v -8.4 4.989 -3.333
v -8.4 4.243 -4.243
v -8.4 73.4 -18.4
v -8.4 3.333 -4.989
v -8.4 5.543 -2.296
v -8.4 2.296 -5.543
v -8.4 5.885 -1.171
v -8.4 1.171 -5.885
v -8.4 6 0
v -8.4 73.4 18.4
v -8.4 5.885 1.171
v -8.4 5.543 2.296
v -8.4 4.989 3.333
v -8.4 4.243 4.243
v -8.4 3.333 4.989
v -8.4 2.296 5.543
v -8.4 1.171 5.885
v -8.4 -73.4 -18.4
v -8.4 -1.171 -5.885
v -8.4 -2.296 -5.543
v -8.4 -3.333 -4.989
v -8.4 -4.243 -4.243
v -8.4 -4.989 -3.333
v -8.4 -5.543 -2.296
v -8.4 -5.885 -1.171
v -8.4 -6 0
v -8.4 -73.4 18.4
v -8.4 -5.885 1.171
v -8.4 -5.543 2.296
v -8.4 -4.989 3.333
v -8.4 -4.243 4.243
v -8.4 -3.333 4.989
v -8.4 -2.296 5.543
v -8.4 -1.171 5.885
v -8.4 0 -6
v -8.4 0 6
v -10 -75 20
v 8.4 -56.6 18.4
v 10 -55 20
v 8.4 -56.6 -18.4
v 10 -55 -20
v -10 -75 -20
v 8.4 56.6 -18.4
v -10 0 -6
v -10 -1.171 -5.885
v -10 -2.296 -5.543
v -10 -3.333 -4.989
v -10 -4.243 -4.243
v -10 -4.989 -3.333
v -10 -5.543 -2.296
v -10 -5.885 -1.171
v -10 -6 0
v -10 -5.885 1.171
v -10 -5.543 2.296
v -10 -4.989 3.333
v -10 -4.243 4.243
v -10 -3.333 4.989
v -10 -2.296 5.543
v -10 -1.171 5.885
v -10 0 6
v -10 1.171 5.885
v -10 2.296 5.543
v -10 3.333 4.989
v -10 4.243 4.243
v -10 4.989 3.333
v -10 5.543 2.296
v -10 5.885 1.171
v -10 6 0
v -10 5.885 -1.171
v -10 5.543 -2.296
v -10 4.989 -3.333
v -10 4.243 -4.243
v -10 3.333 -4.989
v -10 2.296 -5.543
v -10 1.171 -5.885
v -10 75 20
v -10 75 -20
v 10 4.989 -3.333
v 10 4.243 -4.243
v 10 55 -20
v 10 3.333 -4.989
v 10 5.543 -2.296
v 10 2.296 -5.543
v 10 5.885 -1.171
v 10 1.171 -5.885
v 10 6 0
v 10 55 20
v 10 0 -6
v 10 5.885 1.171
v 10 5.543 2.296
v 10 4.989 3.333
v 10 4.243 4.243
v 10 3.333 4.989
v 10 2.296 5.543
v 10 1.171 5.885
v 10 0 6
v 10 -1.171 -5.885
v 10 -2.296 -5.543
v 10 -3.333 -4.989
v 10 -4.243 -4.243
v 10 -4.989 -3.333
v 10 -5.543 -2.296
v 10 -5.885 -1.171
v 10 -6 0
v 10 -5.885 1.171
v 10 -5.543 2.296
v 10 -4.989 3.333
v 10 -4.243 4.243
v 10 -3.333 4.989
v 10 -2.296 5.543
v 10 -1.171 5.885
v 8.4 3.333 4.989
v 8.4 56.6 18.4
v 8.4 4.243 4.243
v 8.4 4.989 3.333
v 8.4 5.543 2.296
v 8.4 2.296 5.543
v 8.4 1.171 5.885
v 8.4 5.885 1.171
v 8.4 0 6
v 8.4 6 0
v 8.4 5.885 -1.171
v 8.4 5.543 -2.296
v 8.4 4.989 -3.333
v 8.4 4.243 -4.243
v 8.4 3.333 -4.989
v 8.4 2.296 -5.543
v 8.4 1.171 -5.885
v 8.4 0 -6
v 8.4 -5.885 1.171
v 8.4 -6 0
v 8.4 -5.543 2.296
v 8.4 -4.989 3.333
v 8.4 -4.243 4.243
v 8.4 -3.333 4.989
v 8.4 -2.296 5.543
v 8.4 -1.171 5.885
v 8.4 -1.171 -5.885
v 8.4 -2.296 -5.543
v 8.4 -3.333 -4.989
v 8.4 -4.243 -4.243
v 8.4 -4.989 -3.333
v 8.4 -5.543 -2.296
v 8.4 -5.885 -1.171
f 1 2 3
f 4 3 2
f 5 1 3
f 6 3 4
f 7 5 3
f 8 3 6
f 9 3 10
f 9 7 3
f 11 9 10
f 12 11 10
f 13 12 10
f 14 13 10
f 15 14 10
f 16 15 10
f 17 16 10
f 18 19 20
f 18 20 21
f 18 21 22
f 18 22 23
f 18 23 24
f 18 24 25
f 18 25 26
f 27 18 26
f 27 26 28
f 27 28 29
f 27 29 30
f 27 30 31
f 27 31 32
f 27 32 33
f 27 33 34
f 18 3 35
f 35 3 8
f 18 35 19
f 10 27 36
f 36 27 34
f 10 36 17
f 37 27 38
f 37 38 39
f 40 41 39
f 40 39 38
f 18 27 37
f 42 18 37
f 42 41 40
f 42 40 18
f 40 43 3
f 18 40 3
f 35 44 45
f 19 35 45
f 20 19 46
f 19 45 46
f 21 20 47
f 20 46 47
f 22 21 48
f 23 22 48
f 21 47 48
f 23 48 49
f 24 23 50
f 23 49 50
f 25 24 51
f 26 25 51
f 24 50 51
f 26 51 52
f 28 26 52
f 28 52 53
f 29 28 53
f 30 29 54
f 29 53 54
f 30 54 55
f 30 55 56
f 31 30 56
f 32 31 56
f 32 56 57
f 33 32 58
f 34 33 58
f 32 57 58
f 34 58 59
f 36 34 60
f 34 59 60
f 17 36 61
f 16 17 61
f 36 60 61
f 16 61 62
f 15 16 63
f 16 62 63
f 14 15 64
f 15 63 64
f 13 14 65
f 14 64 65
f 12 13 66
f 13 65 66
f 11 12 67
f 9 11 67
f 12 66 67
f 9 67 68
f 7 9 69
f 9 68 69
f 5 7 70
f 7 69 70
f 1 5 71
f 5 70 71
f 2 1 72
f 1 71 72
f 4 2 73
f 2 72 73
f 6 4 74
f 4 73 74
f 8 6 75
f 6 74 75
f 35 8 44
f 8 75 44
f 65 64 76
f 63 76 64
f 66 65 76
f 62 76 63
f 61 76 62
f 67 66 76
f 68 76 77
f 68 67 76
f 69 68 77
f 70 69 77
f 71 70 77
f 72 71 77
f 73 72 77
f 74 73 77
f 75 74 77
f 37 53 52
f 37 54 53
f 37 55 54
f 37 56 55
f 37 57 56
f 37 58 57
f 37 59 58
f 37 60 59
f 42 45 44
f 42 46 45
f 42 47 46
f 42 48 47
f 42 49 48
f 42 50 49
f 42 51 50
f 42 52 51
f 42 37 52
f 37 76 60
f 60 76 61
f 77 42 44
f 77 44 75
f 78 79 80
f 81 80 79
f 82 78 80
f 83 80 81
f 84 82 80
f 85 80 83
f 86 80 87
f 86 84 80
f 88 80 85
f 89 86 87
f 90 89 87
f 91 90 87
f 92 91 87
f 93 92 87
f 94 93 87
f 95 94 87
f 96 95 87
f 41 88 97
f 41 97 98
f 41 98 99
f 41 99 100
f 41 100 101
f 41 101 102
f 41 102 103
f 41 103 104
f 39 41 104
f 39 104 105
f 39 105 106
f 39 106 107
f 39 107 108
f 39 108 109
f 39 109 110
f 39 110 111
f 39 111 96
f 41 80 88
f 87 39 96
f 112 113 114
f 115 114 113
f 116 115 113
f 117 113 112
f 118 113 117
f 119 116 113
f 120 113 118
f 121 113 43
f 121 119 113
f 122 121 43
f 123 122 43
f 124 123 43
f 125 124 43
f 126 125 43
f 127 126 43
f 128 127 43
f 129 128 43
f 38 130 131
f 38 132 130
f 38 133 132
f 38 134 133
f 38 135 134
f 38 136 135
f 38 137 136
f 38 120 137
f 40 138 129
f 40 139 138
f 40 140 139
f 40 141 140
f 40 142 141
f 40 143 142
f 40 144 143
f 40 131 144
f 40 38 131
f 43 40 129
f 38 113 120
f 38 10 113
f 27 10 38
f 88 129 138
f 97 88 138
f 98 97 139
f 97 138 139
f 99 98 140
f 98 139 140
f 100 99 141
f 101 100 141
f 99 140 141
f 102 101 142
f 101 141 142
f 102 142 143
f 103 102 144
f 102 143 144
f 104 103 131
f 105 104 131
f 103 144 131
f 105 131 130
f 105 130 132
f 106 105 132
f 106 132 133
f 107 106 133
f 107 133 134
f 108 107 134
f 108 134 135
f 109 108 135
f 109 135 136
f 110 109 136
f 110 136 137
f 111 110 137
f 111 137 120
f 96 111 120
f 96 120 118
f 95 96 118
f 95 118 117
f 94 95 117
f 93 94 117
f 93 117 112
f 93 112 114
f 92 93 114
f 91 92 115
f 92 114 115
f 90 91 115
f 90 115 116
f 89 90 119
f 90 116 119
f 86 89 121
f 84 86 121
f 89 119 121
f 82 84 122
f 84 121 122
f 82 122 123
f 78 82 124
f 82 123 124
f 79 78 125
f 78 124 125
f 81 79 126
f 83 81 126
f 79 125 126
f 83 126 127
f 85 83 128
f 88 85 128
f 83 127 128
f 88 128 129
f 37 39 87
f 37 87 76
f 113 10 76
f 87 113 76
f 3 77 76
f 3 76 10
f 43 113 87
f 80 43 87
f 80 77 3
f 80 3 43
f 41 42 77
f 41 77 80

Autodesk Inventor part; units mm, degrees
ref_plane "YZ Plane" through (0, 0, 0) normal (1, 0, 0) x (0, 1, 0)
ref_plane "XZ Plane" through (0, 0, 0) normal (0, 1, 0) x (-1, 0, 0)
ref_plane "XY Plane" through (0, 0, 0) normal (0, 0, 1) x (1, 0, 0)
sketch "スケッチ2" plane through (0, 0, 0) normal (0, 1, 0) x (-1, 0, 0)
  line L0 (10, -20) -> (-10, -20)
  line L1 (-10, -20) -> (-10, 20)
  line L2 (-10, 20) -> (10, 20)
  line L3 (10, 20) -> (10, -20)
  line L4 (10, -20) -> (-10, 20) construction
  line L5 (-10, -20) -> (10, 20) construction
  line L6 (8.4, 18.4) -> (-8.4, 18.4)
  line L7 (-8.4, 18.4) -> (-8.4, -18.4)
  line L8 (-8.4, -18.4) -> (8.4, -18.4)
  line L9 (8.4, -18.4) -> (8.4, 18.4)
  point P0 (0, 0)
  dimension "d7" = 20
  dimension "d8" = 40
  dimension "d9" = 1.6
extrude "押し出し2" add sketch "スケッチ2" along normal mid plane 150
sketch "スケッチ5" plane through (10, -75, -20) normal (1, 0, 0) x (0, 0, -1)
  point P0 (-20, 75)
  point P1 (-20, 75)
hole "穴2" at (10, 0, 0) direction (-1, 0, 0) diameter 12 end through all
chamfer "面取り1" distance 20 angle 45 2 edges at (10, -75, 0) (10, 75, 0)
properties part number "Pipe3"
